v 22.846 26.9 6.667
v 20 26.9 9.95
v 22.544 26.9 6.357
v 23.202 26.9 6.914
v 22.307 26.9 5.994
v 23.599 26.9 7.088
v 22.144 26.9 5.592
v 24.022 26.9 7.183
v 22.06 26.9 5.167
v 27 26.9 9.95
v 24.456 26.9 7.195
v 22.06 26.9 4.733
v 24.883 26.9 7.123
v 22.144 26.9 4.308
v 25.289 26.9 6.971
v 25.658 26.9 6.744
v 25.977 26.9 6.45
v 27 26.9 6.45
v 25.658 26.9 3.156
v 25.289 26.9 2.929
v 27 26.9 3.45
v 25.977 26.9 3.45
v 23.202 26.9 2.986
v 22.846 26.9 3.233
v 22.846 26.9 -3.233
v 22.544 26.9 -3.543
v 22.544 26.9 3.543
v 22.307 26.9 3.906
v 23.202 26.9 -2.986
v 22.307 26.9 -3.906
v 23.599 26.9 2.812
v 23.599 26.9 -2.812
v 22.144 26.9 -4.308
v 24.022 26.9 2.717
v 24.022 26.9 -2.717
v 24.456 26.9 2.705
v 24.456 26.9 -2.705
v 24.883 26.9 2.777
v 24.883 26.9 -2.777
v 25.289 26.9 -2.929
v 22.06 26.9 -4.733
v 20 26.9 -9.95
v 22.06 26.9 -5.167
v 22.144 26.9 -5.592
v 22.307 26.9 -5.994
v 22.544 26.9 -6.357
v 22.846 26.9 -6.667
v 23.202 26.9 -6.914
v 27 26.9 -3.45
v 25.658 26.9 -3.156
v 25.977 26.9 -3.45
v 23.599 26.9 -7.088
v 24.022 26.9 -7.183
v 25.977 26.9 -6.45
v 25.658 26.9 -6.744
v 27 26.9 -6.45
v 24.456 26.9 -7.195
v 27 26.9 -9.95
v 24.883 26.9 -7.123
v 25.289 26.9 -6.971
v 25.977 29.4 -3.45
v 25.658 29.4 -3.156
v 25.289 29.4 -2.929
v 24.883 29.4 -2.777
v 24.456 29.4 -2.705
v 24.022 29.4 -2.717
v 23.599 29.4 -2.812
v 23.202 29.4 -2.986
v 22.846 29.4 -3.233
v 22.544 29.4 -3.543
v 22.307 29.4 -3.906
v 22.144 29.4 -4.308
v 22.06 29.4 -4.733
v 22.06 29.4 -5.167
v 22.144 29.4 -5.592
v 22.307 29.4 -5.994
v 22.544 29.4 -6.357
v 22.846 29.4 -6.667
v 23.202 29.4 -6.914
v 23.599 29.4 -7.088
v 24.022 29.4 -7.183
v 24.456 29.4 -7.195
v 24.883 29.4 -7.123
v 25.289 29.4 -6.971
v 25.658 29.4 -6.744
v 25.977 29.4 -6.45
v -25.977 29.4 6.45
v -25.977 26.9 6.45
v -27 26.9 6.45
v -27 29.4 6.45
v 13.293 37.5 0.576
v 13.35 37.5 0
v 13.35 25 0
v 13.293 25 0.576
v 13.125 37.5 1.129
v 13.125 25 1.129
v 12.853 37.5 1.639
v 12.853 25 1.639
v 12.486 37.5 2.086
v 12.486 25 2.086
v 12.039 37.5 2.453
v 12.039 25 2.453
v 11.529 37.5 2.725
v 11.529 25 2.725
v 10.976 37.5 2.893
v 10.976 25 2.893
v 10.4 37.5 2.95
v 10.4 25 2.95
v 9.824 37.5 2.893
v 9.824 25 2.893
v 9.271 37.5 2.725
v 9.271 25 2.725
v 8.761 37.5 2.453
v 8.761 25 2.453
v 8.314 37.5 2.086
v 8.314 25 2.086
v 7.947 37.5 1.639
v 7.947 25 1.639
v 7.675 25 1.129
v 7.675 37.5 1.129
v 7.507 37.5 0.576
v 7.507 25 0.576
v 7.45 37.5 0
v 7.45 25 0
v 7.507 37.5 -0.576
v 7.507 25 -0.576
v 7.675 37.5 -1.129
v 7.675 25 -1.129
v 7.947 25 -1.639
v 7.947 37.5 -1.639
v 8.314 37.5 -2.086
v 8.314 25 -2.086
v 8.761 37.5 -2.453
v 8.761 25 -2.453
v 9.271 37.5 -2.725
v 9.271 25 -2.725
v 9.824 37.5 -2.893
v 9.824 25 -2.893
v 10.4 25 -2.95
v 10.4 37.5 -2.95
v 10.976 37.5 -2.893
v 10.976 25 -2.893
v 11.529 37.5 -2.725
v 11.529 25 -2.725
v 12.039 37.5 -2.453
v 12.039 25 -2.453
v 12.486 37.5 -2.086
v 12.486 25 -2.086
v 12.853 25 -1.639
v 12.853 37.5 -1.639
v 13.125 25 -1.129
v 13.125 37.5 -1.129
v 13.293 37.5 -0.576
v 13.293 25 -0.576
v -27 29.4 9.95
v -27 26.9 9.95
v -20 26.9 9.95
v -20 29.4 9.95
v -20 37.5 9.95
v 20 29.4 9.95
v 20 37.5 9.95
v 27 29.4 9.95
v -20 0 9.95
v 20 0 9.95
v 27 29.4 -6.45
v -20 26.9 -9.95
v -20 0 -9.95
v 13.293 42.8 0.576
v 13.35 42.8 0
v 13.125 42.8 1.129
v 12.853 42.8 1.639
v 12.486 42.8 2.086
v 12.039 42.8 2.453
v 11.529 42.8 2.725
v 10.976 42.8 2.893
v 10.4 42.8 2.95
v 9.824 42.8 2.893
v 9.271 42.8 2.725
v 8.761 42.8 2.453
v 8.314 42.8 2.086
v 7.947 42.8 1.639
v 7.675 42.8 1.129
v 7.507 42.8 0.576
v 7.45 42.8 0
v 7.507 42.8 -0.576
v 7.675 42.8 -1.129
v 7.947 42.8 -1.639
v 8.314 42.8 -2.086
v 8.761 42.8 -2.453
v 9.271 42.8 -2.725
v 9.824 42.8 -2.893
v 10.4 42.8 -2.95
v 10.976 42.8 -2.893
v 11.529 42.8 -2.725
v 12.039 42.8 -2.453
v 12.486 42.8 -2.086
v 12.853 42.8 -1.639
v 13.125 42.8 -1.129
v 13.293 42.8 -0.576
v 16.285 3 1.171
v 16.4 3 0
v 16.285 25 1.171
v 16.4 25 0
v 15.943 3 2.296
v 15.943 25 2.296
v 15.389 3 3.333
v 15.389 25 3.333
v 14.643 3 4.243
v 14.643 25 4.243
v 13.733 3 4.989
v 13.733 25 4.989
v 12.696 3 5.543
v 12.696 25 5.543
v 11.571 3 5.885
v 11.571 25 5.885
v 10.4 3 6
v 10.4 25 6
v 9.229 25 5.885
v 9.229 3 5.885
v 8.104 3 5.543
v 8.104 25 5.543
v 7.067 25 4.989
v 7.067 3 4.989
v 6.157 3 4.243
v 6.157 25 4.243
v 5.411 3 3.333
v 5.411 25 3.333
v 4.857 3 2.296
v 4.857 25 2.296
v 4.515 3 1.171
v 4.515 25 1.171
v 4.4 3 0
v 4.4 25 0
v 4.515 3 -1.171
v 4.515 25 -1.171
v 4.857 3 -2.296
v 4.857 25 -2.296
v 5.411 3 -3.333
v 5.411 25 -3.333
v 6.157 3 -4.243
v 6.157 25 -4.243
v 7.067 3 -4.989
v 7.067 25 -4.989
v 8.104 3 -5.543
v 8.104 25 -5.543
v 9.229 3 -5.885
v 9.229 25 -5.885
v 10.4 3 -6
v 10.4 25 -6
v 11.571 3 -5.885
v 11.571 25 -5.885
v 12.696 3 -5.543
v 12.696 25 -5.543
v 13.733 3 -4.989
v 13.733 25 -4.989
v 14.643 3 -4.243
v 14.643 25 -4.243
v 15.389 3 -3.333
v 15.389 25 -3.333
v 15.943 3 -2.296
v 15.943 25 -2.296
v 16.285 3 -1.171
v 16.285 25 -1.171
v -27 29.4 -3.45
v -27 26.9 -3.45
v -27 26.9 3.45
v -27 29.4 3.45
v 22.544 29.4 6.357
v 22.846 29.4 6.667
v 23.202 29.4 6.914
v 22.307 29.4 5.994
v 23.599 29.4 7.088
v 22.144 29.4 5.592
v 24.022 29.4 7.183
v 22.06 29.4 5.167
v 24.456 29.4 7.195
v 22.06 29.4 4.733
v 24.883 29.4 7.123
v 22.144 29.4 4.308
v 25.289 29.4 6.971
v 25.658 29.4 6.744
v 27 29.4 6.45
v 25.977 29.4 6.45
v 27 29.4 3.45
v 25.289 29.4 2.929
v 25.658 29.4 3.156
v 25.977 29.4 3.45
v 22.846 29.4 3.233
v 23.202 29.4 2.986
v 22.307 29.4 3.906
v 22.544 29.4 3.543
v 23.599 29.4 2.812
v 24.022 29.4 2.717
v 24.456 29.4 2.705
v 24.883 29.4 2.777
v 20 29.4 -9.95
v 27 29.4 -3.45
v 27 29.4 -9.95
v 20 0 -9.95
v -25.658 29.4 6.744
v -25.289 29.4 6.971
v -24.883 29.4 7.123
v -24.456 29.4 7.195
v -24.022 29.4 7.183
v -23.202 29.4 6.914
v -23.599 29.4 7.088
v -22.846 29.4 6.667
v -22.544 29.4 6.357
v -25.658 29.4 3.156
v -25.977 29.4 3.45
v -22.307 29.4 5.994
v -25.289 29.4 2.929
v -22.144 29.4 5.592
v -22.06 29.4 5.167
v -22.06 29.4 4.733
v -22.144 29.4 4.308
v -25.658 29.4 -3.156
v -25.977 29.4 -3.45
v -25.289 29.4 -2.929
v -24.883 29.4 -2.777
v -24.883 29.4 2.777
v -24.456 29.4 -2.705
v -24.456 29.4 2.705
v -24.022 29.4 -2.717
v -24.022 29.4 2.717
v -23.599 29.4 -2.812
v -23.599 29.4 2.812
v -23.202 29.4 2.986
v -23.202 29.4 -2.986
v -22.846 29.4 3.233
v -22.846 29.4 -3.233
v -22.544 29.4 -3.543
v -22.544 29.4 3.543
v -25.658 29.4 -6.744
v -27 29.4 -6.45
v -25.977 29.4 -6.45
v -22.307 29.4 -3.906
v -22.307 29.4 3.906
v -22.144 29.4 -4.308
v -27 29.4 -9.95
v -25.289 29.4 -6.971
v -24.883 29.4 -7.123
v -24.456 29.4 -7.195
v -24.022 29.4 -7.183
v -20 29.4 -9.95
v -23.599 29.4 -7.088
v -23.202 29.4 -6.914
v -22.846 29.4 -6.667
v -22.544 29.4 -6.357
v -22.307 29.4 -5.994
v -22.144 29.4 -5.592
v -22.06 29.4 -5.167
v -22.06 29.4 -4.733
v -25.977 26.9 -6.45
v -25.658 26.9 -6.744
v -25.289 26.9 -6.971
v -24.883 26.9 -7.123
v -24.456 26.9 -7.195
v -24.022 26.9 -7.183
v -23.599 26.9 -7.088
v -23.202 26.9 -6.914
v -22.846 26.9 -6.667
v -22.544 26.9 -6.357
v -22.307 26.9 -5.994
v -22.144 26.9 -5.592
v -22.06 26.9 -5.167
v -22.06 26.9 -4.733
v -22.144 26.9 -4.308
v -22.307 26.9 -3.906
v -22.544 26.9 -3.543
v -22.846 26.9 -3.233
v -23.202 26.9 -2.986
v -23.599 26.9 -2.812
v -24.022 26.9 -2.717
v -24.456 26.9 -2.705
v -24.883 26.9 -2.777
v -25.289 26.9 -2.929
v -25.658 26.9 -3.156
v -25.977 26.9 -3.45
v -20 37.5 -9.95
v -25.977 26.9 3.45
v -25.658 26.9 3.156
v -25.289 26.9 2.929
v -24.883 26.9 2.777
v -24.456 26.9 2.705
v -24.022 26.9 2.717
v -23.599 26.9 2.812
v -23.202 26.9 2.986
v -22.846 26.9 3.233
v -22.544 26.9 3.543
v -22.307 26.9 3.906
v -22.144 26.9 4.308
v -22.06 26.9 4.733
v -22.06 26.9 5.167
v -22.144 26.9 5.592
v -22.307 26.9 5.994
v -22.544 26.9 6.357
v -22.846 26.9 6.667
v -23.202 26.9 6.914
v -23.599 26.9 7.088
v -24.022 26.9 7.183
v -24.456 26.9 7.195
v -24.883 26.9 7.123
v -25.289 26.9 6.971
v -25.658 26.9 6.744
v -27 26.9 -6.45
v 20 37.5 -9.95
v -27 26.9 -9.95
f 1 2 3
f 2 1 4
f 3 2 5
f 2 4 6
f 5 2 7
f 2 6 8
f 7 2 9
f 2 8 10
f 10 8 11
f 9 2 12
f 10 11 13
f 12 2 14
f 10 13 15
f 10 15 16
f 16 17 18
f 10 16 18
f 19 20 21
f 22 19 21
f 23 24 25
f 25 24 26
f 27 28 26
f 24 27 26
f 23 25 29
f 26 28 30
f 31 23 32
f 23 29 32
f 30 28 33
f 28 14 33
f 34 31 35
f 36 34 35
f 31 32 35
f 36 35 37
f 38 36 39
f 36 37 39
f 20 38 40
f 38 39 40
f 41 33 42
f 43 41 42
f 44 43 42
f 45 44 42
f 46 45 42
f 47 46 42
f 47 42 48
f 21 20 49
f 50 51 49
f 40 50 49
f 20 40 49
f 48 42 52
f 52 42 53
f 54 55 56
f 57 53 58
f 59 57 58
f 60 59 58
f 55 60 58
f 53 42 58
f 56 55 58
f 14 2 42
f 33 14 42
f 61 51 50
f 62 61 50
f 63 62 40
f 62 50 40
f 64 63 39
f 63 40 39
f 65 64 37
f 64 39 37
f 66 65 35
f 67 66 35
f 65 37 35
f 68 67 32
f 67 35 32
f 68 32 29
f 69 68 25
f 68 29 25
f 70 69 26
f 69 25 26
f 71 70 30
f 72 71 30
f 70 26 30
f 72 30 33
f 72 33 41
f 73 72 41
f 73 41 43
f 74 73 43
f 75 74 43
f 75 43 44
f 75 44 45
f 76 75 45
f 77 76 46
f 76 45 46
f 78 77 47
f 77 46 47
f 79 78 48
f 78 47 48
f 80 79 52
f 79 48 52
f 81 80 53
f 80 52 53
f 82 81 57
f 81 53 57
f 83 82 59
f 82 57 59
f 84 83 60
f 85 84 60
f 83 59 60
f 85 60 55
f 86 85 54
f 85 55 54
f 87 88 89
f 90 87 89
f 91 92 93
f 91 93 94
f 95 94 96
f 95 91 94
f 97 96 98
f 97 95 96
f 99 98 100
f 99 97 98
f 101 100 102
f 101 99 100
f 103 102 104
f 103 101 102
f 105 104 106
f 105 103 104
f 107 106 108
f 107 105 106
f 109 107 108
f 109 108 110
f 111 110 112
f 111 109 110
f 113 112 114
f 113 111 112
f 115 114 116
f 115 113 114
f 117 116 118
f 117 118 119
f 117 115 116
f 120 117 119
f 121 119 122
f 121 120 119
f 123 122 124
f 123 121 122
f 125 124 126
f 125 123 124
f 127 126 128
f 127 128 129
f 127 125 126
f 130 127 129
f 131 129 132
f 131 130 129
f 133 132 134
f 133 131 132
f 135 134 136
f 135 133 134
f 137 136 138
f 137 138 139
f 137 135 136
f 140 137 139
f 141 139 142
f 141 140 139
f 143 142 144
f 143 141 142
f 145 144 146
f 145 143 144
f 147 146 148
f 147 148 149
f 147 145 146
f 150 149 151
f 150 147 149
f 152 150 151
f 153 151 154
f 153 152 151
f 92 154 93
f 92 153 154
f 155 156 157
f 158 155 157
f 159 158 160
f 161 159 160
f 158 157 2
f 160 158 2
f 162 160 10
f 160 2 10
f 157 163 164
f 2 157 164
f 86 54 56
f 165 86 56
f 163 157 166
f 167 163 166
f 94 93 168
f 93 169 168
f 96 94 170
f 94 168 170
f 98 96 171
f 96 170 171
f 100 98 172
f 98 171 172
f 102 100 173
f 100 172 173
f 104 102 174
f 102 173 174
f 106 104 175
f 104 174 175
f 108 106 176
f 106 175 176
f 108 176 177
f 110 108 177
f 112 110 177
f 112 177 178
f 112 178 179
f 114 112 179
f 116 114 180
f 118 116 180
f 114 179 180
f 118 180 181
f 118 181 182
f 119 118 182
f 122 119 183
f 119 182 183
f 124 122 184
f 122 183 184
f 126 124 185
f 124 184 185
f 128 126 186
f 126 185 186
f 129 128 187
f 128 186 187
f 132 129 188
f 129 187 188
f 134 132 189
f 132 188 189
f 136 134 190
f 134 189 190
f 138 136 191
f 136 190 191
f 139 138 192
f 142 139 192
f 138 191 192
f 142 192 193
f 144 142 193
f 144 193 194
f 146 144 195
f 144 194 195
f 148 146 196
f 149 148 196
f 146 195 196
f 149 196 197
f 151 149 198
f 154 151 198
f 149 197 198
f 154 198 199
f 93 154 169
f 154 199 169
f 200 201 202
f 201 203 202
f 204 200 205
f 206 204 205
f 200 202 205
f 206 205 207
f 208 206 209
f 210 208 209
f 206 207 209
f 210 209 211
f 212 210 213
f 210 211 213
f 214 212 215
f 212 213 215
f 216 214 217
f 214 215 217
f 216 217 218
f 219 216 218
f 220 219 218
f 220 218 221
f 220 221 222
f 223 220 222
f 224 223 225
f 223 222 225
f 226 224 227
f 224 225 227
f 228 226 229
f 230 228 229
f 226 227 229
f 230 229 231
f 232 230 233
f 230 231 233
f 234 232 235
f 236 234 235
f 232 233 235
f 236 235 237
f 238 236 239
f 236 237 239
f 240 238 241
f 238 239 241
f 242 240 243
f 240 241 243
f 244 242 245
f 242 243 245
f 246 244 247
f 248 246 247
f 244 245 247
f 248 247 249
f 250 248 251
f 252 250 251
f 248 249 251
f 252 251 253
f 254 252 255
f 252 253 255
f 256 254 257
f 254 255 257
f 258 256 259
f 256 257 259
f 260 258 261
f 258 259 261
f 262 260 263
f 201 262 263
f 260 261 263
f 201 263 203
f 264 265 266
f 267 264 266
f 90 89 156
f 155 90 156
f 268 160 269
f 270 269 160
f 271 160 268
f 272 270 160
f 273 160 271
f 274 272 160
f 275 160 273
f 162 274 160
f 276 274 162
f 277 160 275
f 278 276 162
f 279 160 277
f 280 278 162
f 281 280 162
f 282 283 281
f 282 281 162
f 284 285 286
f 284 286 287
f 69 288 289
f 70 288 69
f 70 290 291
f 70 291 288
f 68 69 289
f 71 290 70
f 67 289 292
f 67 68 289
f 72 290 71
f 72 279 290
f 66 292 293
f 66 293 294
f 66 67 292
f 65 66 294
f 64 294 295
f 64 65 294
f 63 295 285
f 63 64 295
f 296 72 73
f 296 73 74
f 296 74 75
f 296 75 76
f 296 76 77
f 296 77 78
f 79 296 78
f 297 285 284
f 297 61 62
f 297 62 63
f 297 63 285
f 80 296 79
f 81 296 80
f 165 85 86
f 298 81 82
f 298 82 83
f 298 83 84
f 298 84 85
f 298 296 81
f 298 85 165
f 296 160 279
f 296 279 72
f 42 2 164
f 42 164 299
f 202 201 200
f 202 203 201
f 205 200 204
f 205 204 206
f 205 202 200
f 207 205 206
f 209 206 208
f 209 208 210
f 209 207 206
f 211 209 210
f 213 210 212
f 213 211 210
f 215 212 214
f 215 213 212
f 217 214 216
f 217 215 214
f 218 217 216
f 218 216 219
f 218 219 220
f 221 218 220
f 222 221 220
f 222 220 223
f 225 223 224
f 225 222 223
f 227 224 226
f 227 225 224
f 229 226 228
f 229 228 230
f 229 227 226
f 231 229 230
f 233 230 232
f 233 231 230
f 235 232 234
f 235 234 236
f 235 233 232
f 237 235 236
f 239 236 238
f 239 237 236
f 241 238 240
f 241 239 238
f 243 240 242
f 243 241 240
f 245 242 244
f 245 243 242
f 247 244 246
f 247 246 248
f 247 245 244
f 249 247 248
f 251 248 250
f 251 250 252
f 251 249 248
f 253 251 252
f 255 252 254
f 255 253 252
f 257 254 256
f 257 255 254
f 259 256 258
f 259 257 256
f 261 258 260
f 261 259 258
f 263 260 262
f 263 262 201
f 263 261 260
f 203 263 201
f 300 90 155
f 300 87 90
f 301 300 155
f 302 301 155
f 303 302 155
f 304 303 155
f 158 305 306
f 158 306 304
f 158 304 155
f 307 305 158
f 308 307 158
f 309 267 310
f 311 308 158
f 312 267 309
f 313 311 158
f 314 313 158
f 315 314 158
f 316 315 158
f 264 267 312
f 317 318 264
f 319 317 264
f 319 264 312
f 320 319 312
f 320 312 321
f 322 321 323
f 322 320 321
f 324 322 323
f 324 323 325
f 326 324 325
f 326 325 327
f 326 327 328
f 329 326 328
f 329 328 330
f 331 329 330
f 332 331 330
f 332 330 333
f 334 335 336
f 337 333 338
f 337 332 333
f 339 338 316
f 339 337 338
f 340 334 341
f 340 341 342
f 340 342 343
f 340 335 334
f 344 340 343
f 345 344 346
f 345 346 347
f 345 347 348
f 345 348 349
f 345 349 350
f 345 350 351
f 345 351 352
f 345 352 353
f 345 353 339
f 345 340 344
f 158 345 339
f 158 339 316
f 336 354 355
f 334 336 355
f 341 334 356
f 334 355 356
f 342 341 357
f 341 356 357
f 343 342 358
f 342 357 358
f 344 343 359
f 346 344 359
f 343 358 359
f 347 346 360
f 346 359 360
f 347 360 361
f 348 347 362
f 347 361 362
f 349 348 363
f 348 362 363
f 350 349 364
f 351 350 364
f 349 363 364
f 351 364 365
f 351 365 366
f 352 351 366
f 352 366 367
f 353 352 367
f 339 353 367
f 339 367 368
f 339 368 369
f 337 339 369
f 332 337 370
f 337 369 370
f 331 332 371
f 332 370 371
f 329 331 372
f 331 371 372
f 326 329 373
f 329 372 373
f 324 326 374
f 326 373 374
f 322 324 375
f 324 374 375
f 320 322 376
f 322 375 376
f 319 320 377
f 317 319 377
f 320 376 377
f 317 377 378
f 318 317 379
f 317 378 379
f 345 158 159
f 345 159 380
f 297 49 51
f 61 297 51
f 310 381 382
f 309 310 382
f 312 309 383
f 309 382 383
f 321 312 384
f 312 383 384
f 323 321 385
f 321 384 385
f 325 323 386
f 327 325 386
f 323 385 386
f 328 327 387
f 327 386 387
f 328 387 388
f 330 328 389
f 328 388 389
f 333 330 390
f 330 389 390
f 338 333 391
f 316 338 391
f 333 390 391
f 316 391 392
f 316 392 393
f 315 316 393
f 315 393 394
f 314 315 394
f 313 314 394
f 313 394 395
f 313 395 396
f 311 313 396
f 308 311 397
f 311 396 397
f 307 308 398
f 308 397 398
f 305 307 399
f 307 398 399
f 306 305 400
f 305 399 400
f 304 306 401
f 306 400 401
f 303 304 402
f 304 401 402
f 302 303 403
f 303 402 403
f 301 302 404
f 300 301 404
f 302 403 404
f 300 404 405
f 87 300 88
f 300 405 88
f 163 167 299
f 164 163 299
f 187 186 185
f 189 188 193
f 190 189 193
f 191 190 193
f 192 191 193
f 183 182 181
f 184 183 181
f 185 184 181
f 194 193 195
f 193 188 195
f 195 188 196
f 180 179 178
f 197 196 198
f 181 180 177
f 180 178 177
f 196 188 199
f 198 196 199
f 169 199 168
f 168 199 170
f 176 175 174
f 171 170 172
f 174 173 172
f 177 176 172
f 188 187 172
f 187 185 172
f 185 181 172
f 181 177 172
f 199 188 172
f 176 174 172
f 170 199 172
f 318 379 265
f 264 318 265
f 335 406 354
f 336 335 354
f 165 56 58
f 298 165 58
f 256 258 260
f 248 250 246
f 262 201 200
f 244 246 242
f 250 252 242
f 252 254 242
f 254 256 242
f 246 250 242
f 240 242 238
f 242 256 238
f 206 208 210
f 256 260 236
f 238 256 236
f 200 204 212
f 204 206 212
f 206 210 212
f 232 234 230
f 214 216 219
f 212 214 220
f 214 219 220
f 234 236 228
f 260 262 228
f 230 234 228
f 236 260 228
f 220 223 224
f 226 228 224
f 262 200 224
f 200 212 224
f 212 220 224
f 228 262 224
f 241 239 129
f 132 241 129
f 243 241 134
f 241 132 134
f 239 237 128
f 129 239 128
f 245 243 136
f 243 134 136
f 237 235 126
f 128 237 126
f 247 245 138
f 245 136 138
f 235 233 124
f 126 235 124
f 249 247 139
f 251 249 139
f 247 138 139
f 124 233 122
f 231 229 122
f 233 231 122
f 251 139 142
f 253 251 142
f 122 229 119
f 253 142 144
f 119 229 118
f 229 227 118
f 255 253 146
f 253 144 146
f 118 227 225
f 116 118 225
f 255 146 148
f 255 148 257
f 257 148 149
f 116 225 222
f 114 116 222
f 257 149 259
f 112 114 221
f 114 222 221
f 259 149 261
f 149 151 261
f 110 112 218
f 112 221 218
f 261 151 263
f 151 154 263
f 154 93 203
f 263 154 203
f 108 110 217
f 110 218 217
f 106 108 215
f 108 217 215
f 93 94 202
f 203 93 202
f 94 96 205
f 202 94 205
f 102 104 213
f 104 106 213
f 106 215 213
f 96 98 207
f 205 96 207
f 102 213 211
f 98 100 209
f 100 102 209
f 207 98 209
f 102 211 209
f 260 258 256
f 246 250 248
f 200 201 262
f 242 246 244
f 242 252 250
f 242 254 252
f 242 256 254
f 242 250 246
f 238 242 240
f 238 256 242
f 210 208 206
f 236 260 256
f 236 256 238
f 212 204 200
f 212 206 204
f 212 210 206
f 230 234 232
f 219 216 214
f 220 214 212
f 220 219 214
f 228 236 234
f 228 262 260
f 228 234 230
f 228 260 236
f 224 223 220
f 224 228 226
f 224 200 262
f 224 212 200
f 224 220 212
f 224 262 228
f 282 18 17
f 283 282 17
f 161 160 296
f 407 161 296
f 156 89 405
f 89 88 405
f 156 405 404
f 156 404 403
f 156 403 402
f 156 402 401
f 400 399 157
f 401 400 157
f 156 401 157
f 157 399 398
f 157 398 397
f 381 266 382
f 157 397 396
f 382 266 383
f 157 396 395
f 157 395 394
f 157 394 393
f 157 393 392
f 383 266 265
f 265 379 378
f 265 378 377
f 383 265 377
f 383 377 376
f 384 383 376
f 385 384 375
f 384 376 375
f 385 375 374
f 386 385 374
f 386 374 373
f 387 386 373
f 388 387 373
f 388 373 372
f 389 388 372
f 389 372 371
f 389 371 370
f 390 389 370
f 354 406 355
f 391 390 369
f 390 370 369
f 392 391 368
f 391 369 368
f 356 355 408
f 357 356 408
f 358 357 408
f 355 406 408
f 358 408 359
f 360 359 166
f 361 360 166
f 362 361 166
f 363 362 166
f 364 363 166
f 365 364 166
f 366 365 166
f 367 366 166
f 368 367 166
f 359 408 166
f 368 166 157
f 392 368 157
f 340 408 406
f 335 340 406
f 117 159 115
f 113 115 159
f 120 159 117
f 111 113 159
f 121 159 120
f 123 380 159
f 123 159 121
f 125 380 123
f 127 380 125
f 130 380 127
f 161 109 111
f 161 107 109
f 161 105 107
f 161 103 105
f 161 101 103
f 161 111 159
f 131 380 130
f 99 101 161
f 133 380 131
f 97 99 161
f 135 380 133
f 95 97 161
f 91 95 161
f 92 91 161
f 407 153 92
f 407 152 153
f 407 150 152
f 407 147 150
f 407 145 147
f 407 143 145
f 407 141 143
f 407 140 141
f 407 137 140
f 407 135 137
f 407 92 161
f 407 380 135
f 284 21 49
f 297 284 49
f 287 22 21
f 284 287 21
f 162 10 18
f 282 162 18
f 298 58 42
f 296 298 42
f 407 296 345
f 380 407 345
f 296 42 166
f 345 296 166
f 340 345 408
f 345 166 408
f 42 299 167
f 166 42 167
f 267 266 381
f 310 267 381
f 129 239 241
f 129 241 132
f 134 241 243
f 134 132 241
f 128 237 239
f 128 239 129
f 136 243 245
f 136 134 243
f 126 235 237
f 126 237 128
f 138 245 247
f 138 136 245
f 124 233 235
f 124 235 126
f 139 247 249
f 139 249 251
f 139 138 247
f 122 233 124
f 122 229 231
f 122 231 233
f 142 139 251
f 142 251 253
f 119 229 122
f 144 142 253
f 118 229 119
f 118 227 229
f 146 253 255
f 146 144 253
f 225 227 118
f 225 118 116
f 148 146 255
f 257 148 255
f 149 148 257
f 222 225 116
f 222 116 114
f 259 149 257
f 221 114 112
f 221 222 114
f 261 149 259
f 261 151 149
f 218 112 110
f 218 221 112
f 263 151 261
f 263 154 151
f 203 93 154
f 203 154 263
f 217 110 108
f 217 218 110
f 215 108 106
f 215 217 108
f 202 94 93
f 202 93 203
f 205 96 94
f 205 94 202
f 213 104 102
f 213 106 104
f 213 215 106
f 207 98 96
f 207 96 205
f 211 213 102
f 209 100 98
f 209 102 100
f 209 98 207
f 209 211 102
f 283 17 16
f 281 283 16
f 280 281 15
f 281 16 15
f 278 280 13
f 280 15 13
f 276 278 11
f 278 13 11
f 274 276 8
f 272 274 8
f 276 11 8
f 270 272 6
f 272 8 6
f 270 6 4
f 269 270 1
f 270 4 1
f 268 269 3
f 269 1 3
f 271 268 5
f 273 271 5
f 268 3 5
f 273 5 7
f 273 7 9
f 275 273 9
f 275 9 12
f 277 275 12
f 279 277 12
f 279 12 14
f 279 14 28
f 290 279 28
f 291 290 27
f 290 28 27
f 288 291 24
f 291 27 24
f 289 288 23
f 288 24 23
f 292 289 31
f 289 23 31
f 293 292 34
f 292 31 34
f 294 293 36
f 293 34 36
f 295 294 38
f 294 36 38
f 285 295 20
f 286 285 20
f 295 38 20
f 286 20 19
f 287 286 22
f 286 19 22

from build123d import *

# Parameters (mm, degrees)
SKETCH1_W           = 40
SKETCH1_H           = 19.9
BOSS_EXTRUDE1_DEPTH = 26.9
BOSS_EXTRUDE2_DEPTH = 2.5
SKETCH5_W           = 40
SKETCH5_H           = 19.9
BOSS_EXTRUDE3_DEPTH = 8.1


with BuildPart() as part:
    # Sketch1 → Boss-Extrude1 (new body)
    with BuildSketch(Plane(origin=(0, 0, 0), x_dir=(1, 0, 0), z_dir=(0, 1, 0))):
        Rectangle(SKETCH1_W, SKETCH1_H)
    extrude(amount=BOSS_EXTRUDE1_DEPTH)

    # Sketch4 → Boss-Extrude2 (add)
    with BuildSketch(Plane(origin=(0, 26.9, 0), x_dir=(1, 0, 0), z_dir=(0, 1, 0))):
        with BuildLine():
            Line((-27, -9.95), (27, -9.95))
            Line((27, -9.95), (27, -6.45))
            Line((27, -6.45), (25.977050983, -6.45))
            ThreePointArc((25.977050983, -6.45), (22.05, -4.95), (25.977050983, -3.45))
            Line((25.977050983, -3.45), (27, -3.45))
            Line((27, -3.45), (27, 3.45))
            Line((27, 3.45), (25.977050983, 3.45))
            ThreePointArc((25.977050983, 3.45), (22.05, 4.95), (25.977050983, 6.45))
            Line((25.977050983, 6.45), (27, 6.45))
            Line((27, 6.45), (27, 9.95))
            Line((27, 9.95), (-27, 9.95))
            Line((-27, 9.95), (-27, 6.45))
            Line((-27, 6.45), (-25.977050983, 6.45))
            ThreePointArc((-25.977050983, 6.45), (-22.05, 4.95), (-25.977050983, 3.45))
            Line((-25.977050983, 3.45), (-27, 3.45))
            Line((-27, 3.45), (-27, -3.45))
            Line((-27, -3.45), (-25.977050983, -3.45))
            ThreePointArc((-25.977050983, -3.45), (-22.05, -4.95), (-25.977050983, -6.45))
            Line((-25.977050983, -6.45), (-27, -6.45))
            Line((-27, -6.45), (-27, -9.95))
        make_face()
    extrude(amount=BOSS_EXTRUDE2_DEPTH)

    # Sketch5 → Boss-Extrude3 (add)
    with BuildSketch(Plane(origin=(0, 29.4, 0), x_dir=(1, 0, 0), z_dir=(0, 1, 0))):
        Rectangle(SKETCH5_W, SKETCH5_H)
    extrude(amount=BOSS_EXTRUDE3_DEPTH)

    # Sketch8 → Cut-Revolve1 (revolve, cut)
    with BuildSketch(Plane.XY):
        Polygon((10.4, 42.8), (10.4, 3), (16.4, 3), (16.4, 25), (13.35, 25), (13.35, 42.8), align=None)
    revolve(axis=Axis((10.4, 42.8, 0), (0, -1, 0)), mode=Mode.SUBTRACT)


with BuildPart() as body_2:
    # Sketch8<2> → Revolve1 (revolve)
    with BuildSketch(Plane.XY):
        Polygon((10.4, 42.8), (10.4, 3), (16.4, 3), (16.4, 25), (13.35, 25), (13.35, 42.8), align=None)
    revolve(axis=Axis((10.4, 42.8, 0), (0, -1, 0)))


solid = Compound([part.part, body_2.part])
